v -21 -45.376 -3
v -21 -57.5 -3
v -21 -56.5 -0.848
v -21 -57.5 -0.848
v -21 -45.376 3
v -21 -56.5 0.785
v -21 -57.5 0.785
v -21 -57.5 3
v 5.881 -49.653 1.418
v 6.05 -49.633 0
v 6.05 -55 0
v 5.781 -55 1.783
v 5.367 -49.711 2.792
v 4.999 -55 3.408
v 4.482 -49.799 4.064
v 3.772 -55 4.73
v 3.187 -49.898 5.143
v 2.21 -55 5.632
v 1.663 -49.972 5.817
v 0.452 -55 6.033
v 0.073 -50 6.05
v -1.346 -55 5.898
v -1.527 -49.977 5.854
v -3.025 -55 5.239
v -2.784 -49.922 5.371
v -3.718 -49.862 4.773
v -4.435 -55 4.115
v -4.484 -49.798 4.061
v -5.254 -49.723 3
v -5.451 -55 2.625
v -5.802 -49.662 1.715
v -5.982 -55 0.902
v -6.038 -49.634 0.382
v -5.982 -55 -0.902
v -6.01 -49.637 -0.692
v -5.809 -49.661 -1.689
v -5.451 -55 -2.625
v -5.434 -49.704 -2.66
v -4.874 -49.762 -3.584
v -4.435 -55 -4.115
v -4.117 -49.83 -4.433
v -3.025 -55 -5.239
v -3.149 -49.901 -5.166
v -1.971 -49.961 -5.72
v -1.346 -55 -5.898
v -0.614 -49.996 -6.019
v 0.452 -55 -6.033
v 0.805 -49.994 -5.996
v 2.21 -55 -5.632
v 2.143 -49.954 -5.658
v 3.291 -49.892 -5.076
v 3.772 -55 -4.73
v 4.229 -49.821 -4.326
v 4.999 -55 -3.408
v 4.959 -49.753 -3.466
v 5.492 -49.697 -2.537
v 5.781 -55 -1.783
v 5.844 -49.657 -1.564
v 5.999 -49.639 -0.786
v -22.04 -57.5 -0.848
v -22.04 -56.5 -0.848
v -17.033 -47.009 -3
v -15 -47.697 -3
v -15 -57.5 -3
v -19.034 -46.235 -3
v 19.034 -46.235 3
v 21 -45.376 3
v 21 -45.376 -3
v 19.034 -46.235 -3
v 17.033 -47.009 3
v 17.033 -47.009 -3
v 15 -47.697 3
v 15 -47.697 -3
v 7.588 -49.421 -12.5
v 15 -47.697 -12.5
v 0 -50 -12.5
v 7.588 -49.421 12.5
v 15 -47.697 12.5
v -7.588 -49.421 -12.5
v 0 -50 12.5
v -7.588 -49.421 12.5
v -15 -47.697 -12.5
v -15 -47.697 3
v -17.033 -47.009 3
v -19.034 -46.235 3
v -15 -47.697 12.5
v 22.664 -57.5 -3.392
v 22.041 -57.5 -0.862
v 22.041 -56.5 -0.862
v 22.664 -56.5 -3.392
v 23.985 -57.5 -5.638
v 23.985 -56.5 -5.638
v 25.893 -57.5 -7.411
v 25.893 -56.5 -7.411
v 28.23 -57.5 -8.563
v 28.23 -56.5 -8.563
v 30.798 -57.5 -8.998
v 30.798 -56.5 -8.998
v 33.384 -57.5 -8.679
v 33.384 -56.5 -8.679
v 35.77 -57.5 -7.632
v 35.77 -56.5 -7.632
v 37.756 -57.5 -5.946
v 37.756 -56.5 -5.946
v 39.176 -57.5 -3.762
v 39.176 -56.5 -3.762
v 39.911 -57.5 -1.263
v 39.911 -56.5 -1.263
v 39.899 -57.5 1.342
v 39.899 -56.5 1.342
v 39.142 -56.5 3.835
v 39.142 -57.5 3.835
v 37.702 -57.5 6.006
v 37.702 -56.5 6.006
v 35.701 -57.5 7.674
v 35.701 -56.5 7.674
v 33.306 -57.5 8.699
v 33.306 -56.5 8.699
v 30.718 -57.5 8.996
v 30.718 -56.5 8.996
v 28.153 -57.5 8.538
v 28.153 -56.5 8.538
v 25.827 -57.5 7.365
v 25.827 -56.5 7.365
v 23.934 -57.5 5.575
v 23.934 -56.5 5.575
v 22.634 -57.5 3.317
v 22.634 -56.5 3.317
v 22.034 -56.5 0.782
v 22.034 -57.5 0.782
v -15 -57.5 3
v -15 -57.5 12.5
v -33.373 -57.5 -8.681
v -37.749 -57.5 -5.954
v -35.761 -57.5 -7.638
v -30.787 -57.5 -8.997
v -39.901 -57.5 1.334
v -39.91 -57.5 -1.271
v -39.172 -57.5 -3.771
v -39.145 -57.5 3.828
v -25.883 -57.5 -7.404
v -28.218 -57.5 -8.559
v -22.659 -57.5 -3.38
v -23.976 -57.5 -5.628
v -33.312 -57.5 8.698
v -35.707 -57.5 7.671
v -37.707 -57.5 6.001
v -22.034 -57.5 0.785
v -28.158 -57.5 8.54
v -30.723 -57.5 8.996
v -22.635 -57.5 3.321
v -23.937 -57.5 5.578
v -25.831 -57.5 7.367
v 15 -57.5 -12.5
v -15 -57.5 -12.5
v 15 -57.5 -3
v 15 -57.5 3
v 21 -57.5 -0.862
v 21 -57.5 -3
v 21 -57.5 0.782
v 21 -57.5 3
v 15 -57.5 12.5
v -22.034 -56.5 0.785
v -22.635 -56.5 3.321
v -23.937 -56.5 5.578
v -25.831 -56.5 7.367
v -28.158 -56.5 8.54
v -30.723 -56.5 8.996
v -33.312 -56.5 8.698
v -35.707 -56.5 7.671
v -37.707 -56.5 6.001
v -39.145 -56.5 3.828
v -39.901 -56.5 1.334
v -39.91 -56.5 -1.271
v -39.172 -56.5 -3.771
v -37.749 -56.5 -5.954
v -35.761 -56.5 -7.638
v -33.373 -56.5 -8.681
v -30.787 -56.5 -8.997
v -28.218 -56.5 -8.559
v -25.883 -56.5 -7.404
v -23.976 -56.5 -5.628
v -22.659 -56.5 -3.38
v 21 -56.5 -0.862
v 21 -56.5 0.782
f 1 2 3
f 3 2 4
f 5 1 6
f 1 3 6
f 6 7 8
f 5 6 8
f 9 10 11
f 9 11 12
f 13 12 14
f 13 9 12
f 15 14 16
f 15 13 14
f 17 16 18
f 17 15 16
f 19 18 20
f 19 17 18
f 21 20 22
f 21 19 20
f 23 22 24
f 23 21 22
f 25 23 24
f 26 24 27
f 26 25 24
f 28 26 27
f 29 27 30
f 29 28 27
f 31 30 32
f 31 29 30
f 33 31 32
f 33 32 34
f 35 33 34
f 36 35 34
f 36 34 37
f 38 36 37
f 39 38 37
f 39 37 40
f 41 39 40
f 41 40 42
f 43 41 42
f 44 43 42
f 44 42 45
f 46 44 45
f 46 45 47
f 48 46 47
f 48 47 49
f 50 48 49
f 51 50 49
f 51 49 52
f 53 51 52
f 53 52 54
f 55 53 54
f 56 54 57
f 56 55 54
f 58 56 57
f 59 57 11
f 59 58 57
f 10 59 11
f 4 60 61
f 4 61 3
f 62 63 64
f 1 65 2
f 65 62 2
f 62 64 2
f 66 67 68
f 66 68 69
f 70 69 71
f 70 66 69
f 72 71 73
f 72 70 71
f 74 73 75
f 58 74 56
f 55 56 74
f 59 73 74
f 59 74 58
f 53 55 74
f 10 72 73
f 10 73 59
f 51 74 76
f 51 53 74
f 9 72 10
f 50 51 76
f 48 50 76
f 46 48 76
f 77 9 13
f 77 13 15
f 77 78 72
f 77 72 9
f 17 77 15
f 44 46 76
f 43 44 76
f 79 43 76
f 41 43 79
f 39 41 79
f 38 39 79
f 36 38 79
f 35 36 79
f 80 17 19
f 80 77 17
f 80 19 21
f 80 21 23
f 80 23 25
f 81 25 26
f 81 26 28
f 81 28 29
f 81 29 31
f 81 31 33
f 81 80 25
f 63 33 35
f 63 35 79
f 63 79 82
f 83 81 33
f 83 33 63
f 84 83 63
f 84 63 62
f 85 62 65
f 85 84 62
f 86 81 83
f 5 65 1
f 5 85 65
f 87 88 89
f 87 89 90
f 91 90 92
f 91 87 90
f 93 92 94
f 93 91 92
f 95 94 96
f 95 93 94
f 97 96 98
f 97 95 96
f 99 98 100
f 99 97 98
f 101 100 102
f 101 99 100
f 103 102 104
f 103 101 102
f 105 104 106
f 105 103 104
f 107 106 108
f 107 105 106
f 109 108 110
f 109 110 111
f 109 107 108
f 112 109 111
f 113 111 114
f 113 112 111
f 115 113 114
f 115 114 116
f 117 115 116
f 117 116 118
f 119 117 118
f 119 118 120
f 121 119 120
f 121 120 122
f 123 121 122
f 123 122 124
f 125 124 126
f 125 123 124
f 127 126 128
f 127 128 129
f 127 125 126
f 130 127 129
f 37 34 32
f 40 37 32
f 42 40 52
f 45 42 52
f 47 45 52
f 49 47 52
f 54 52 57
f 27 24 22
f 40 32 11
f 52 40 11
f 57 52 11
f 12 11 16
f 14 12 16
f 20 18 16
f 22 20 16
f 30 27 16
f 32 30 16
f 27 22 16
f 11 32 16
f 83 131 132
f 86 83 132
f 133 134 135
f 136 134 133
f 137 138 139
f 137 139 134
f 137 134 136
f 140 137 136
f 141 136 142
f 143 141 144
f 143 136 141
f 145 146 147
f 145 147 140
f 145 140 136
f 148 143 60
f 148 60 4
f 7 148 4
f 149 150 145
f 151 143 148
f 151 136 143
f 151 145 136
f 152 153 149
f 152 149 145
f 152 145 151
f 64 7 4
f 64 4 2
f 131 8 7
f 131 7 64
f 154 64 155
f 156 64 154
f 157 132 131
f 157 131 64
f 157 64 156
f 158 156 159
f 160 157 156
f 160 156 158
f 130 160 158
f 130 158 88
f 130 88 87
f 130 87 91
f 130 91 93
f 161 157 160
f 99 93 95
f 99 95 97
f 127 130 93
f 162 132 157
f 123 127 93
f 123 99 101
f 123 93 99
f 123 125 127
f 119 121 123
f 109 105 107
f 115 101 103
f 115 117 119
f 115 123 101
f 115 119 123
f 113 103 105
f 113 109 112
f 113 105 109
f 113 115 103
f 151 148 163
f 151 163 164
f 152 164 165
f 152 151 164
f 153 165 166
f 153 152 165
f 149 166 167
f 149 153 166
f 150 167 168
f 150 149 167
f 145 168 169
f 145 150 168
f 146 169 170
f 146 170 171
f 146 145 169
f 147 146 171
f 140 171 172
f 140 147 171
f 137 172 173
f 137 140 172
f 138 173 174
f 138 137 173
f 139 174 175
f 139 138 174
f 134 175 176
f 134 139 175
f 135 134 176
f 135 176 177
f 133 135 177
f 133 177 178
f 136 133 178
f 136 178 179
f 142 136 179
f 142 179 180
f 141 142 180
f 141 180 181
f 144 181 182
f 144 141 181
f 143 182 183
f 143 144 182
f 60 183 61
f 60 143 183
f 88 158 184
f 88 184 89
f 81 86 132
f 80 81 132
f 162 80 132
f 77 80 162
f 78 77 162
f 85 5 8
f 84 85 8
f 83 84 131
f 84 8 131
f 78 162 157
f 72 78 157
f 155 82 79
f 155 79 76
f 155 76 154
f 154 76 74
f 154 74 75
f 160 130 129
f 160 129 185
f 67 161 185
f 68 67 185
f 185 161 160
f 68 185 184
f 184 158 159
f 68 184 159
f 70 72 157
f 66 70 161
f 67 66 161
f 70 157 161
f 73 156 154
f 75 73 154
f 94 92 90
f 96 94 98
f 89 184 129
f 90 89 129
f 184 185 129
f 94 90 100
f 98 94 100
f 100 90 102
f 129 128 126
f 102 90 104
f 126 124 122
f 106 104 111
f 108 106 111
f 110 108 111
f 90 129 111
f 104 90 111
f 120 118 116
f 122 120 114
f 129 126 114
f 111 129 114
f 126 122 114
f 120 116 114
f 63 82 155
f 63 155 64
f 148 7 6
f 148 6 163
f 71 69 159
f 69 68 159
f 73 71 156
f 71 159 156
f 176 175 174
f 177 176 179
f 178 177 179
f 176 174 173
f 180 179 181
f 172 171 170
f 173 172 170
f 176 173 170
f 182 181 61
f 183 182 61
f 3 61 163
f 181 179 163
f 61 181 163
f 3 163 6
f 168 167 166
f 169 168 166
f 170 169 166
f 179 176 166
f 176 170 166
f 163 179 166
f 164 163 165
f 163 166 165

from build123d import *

# Parameters (mm, degrees)
F1_DEPTH  = 12.5
F3_DEPTH  = 25
F4_R      = 6.05
F5_DEPTH  = 55
F6_R      = 9.05
F7_DEPTH  = 52.5
F9_DEPTH  = 3
F11_DEPTH = 57.501
F13_DEPTH = 1


with BuildPart() as f1:
    # F0 (on Top) → F1 (new body, symmetric)
    with BuildSketch(Plane.XY):
        with BuildLine():
            ThreePointArc((50, 0), (0, -50), (-50, 0))
            Line((-50, 0), (-55, 0))
            ThreePointArc((-55, 0), (0, -55), (55, 0))
            Line((55, 0), (50, 0))
        make_face()
    extrude(amount=F1_DEPTH, both=True)

    # F2 (on face) → F3 (join)
    with BuildSketch(Plane.XY.offset(12.5)):
        with BuildLine():
            ThreePointArc((55, 0), (0, -55), (-55, 0))
            Line((-55, 0), (-55, -57.5))
            Line((-55, -57.5), (0, -57.5))
            Line((0, -57.5), (55, -57.5))
            Line((55, -57.5), (55, 0))
        make_face()
    extrude(amount=-F3_DEPTH)

    # F4 (on Front) → F5 (cut)
    with BuildSketch(Plane.XZ):
        Circle(F4_R)
    extrude(amount=F5_DEPTH, mode=Mode.SUBTRACT)

    # F6 (on Right) → F7 (cut, symmetric)
    with BuildSketch(Plane.YZ):
        with Locations((-11, 0)):
            Circle(F6_R)
    extrude(amount=F7_DEPTH, both=True, mode=Mode.SUBTRACT)

    # F8 (on face) → F9 (join)
    with BuildSketch(Plane.XZ.offset(57.5)):
        with BuildLine():
            Line((55, -1.825145), (56.187007, -1.825145))
            ThreePointArc((56.187007, -1.825145), (73.996764, 0.241309), (56.101841, 1.350101))
            Line((56.101841, 1.350101), (55, 1.350101))
            Line((55, 1.350101), (55, -1.825145))
        make_face()
        with BuildLine():
            Line((-55, 0.589209), (-56.019308, 0.589209))
            ThreePointArc((-56.019308, 0.589209), (-73.999691, -0.074534), (-56.010781, -0.440385))
            Line((-56.010781, -0.440385), (-55, -0.440385))
            Line((-55, -0.440385), (-55, 0.589209))
        make_face()
        with BuildLine():
            Line((26.665892, -12.5), (26.665892, -13.538735))
            ThreePointArc((26.665892, -13.538735), (27.491135, -31.499996), (28.35176, -13.540396))
            Line((28.35176, -13.540396), (28.35176, -12.5))
            Line((28.35176, -12.5), (26.665892, -12.5))
        make_face()
        with BuildLine():
            Line((-28.294771, -12.5), (-28.294771, -13.535161))
            ThreePointArc((-28.294771, -13.535161), (-27.521055, -31.499975), (-26.663293, -13.538978))
            Line((-26.663293, -13.538978), (-26.663293, -12.5))
            Line((-26.663293, -12.5), (-28.294771, -12.5))
        make_face()
        with BuildLine():
            Line((-26.327094, 12.5), (-26.327094, 13.576756))
            ThreePointArc((-26.327094, 13.576756), (-27.667739, 31.498437), (-28.339533, 13.539242))
            Line((-28.339533, 13.539242), (-28.339533, 12.5))
            Line((-28.339533, 12.5), (-26.327094, 12.5))
        make_face()
        with BuildLine():
            Line((28.639116, 12.5), (28.639116, 13.572379))
            ThreePointArc((28.639116, 13.572379), (27.368028, 31.499032), (26.623167, 13.542815))
            Line((26.623167, 13.542815), (26.623167, 12.5))
            Line((26.623167, 12.5), (28.639116, 12.5))
        make_face()
    extrude(amount=-F9_DEPTH)

    # F10 (on face) → F11 (cut, through all)
    with BuildSketch(Plane.XZ.offset(57.5)):
        Polygon((-15, 3), (-15, 12.5), (-15, 43.200534), (-80.149591, 43.200534), (-80.149591, -41.894257), (-15, -41.894257), (-15, -12.5), (-15, -3), (-21, -3), (-21, 0), (-21, 3), align=None)
        Polygon((15, 42.100117), (15, 12.5), (15, 3), (21, 3), (21, 0), (21, -3), (15, -3), (15, -12.5), (15, -47.119375), (79.776369, -47.119375), (79.776369, 42.100117), align=None)
    extrude(amount=-F11_DEPTH, mode=Mode.SUBTRACT)

    # F12 (on face) → F13 (join)
    with BuildSketch(Plane.XZ.offset(57.5)):
        with BuildLine():
            Line((-21, 0.785101), (-22.034309, 0.785101))
            ThreePointArc((-22.034309, 0.785101), (-39.999944, 0.031742), (-22.04007, -0.848323))
            Line((-22.04007, -0.848323), (-21, -0.848323))
            Line((-21, -0.848323), (-21, 0.785101))
        make_face()
        with BuildLine():
            Line((21, -0.86237), (22.041411, -0.86237))
            ThreePointArc((22.041411, -0.86237), (39.99991, 0.040222), (22.034061, 0.782262))
            Line((22.034061, 0.782262), (21, 0.782262))
            Line((21, 0.782262), (21, -0.86237))
        make_face()
    extrude(amount=-F13_DEPTH)


solid = f1.part
